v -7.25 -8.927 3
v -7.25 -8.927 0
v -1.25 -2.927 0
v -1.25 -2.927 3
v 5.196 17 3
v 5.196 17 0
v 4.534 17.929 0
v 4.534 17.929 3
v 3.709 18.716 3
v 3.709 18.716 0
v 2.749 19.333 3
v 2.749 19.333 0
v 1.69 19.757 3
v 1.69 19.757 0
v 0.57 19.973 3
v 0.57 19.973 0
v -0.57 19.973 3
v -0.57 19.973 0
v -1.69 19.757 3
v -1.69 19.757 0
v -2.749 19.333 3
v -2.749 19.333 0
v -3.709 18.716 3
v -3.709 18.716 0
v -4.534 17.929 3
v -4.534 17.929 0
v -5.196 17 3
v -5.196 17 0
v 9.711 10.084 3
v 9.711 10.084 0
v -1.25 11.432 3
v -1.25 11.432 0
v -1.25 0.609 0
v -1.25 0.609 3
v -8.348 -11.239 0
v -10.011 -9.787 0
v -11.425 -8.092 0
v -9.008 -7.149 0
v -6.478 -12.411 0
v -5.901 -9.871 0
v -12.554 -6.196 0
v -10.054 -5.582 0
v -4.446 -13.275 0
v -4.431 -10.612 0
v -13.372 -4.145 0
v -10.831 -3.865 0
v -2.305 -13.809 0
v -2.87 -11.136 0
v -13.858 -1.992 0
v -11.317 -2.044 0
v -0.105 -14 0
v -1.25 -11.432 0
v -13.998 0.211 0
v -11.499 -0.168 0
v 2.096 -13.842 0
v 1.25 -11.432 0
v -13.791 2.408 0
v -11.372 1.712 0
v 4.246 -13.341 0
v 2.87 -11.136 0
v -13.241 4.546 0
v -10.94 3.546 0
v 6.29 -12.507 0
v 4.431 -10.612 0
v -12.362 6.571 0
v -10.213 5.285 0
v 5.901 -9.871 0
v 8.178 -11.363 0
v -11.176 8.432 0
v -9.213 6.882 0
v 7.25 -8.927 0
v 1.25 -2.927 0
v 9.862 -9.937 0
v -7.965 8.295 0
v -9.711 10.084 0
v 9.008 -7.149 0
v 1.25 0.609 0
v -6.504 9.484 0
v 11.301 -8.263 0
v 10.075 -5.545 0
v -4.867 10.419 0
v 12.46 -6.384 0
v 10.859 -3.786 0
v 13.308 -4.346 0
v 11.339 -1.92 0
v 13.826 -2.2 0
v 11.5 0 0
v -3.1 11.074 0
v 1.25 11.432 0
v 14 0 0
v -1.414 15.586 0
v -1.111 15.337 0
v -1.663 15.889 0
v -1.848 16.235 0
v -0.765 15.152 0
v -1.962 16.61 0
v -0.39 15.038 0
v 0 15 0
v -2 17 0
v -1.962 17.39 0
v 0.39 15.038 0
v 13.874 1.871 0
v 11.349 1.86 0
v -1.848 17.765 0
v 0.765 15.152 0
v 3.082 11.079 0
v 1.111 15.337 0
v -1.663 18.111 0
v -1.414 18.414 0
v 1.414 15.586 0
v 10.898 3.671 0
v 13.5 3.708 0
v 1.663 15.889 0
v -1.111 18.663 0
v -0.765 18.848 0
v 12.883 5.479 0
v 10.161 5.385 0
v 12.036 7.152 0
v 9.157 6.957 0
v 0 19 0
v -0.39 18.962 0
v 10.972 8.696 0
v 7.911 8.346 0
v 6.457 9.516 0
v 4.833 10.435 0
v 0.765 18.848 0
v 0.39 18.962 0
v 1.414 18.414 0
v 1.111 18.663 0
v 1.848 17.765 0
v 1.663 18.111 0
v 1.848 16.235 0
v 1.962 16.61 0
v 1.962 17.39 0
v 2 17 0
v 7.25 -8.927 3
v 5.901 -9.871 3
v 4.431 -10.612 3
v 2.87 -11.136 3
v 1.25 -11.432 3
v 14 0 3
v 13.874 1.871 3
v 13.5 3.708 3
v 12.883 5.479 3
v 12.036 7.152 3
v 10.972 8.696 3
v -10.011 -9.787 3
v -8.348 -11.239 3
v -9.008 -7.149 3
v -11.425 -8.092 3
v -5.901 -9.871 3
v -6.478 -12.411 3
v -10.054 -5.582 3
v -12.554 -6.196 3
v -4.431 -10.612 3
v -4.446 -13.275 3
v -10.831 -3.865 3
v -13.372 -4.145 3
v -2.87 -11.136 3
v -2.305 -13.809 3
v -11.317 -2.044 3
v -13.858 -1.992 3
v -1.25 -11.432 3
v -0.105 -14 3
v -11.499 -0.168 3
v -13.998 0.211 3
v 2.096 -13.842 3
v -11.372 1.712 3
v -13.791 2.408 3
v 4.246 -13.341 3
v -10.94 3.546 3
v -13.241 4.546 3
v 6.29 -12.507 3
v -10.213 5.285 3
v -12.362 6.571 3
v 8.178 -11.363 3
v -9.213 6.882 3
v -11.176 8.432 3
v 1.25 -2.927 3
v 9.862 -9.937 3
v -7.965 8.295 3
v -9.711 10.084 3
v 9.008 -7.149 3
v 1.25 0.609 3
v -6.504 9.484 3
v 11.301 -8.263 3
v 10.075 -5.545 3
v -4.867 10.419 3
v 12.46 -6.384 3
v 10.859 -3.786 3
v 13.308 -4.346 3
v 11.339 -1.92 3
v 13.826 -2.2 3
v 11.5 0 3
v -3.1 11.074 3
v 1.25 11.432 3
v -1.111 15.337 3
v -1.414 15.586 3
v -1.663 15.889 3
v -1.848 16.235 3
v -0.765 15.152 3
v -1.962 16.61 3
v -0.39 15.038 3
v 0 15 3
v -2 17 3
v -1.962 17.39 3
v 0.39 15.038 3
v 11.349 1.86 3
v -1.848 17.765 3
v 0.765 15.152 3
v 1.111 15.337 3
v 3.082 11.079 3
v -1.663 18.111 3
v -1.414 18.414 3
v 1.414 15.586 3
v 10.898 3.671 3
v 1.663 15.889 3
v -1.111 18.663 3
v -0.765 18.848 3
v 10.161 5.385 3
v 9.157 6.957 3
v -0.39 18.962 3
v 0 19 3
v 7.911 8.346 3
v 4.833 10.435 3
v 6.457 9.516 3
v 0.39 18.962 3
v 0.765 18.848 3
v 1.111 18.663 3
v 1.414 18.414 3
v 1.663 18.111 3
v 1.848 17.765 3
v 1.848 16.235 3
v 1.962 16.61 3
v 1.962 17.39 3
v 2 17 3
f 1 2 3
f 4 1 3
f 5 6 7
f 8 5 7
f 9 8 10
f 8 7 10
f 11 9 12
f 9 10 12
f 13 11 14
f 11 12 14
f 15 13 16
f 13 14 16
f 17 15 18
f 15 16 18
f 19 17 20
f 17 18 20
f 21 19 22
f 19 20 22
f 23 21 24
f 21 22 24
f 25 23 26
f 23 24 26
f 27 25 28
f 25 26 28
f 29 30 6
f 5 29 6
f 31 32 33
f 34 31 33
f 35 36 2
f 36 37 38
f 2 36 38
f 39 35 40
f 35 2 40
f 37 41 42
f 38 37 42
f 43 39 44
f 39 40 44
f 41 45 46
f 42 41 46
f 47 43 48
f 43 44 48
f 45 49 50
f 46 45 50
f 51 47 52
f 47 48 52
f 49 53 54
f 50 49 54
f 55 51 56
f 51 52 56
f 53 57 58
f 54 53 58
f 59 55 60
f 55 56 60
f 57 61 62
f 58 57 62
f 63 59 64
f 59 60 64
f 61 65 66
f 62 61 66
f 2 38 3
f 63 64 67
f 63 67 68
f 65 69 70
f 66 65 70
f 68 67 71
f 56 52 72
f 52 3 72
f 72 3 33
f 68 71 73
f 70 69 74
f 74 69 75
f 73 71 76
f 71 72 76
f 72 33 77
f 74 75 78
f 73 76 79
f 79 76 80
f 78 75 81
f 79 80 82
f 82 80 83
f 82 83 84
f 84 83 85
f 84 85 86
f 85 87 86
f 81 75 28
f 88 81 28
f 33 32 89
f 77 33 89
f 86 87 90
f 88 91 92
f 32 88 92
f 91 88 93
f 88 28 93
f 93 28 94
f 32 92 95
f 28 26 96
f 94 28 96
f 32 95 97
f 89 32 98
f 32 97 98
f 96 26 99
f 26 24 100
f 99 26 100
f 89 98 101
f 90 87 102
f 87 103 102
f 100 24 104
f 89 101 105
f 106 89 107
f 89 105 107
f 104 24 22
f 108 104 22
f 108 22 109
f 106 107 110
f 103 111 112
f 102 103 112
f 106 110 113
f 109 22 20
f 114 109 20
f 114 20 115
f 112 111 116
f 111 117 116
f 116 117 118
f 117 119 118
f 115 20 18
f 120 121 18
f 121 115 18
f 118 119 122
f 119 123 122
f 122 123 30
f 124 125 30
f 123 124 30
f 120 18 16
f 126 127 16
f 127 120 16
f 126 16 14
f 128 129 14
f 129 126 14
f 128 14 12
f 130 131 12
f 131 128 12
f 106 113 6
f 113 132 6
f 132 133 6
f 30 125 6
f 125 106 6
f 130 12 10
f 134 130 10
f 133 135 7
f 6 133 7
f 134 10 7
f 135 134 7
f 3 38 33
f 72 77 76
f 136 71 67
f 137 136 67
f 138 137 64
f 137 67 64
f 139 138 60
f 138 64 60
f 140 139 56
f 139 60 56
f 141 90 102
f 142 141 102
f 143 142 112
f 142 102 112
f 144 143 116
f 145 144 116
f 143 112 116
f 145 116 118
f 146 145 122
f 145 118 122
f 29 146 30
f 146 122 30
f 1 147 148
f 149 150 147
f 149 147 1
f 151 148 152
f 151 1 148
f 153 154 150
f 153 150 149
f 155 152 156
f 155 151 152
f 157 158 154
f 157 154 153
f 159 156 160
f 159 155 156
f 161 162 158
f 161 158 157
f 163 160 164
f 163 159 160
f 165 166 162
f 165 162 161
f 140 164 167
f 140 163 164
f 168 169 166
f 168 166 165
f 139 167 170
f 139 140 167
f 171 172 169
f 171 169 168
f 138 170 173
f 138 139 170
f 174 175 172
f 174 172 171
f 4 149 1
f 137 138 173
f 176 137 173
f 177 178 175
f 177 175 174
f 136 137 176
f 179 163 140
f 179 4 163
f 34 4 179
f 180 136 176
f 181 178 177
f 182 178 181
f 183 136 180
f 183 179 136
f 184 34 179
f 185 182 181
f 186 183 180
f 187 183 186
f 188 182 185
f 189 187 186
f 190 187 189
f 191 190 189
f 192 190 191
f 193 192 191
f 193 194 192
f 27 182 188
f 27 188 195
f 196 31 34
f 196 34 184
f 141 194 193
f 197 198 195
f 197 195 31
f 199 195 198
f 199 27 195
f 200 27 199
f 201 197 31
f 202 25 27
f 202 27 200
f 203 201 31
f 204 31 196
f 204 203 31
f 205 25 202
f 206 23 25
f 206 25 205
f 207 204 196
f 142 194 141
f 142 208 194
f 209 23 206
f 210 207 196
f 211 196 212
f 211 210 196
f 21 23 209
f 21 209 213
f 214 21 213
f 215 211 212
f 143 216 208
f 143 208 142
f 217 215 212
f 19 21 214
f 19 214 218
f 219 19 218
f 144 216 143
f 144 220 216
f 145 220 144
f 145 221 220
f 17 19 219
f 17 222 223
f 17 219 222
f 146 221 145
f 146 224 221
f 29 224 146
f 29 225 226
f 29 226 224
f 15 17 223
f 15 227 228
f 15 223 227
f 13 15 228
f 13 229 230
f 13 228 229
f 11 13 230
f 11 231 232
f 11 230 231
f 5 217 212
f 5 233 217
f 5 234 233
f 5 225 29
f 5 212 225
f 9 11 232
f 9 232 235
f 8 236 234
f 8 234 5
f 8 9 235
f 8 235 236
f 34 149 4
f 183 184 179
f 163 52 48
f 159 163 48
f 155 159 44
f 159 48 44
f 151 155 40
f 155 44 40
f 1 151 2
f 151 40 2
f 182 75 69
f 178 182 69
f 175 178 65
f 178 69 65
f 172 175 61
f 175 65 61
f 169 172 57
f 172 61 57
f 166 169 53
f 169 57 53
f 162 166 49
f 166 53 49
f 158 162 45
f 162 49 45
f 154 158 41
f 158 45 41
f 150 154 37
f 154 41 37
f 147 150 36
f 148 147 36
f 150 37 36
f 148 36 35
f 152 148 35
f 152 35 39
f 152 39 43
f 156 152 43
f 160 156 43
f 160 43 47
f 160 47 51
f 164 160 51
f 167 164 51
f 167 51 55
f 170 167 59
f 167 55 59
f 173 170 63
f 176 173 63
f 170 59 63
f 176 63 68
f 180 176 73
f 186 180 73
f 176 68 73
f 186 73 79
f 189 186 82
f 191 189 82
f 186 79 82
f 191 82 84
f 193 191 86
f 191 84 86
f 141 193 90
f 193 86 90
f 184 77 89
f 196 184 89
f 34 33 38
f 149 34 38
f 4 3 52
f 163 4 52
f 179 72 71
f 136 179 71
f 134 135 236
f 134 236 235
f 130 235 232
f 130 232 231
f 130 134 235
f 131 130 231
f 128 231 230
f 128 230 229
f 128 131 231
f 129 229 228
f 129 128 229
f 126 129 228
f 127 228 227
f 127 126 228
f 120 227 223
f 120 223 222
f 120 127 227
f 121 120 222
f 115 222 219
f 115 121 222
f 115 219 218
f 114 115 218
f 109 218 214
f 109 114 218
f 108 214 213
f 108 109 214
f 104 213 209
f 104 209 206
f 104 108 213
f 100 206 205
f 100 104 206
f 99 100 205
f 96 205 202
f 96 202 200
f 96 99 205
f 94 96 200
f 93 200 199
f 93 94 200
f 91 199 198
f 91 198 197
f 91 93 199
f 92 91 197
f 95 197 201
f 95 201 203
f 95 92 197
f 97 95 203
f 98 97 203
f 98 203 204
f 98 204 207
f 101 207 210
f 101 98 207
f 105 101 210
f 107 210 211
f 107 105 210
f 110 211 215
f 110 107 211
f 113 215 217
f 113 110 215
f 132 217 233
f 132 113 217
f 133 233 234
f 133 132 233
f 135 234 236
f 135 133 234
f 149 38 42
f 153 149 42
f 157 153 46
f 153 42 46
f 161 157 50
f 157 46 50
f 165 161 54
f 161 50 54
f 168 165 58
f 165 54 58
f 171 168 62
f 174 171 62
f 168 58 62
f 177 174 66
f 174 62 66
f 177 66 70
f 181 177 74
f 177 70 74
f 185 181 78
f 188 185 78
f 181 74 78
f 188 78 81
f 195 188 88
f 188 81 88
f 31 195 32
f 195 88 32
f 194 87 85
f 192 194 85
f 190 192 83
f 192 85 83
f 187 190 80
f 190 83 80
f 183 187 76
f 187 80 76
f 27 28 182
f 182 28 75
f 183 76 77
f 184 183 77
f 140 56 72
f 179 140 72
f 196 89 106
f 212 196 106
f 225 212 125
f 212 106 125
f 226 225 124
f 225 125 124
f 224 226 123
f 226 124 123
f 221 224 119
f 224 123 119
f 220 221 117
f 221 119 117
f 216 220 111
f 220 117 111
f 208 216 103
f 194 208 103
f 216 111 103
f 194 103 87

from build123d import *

# Parameters (mm, degrees)
F1_R     = 2
F2_DEPTH = 3


with BuildPart() as f2:
    # F1 (on Top) → F2 (new body)
    with BuildSketch(Plane.XY):
        with BuildLine():
            ThreePointArc((-9.7114153746, 10.0840672063), (-5.4790594428, -12.8833189676), (14, 0))
            ThreePointArc((14, 0), (12.8833189676, 5.4790594428), (9.7114153746, 10.0840672063))
            ThreePointArc((9.7114153746, 10.0840672063), (7.8963049332, 11.5606387541), (5.8606261419, 12.7142857143))
            ThreePointArc((5.8606261419, 12.7142857143), (0, 14), (-5.8606261419, 12.7142857143))
            ThreePointArc((-5.8606261419, 12.7142857143), (-7.8963049332, 11.5606387541), (-9.7114153746, 10.0840672063))
        make_face()
        with BuildLine():
            ThreePointArc((1.25, 11.4318633652), (8.5622718948, 7.6770762664), (11.5, 0))
            ThreePointArc((11.5, 0), (10.8590955773, -3.7855043577), (9.0078185666, -7.1490701963))
            ThreePointArc((9.0078185666, -7.1490701963), (8.1773610714, -8.0858373659), (7.25, -8.9267855357))
            ThreePointArc((7.25, -8.9267855357), (4.4307283524, -10.6121932826), (1.25, -11.4318633652))
            ThreePointArc((1.25, -11.4318633652), (0, -11.5), (-1.25, -11.4318633652))
            ThreePointArc((-1.25, -11.4318633652), (-4.4307283524, -10.6121932826), (-7.25, -8.9267855357))
            ThreePointArc((-7.25, -8.9267855357), (-8.1773610714, -8.0858373659), (-9.0078185666, -7.1490701963))
            ThreePointArc((-9.0078185666, -7.1490701963), (-10.6121856109, 4.4307467271), (-1.25, 11.4318633652))
            ThreePointArc((-1.25, 11.4318633652), (0, 11.5), (1.25, 11.4318633652))
        make_face(mode=Mode.SUBTRACT)
        with BuildLine():
            ThreePointArc((5.8606261419, 12.7142857143), (7.8963049332, 11.5606387541), (9.7114153746, 10.0840672063))
            Line((9.7114153746, 10.0840672063), (5.1961524227, 17))
            ThreePointArc((5.1961524227, 17), (5.9291588604, 14.9192797226), (5.8606261419, 12.7142857143))
        make_face()
        with BuildLine():
            Line((-5.1961524227, 17), (-9.7114153746, 10.0840672063))
            ThreePointArc((-9.7114153746, 10.0840672063), (-7.8963049332, 11.5606387541), (-5.8606261419, 12.7142857143))
            ThreePointArc((-5.8606261419, 12.7142857143), (-5.9291588604, 14.9192797226), (-5.1961524227, 17))
        make_face()
        with BuildLine():
            ThreePointArc((-5.8606261419, 12.7142857143), (0, 14), (5.8606261419, 12.7142857143))
            ThreePointArc((5.8606261419, 12.7142857143), (5.9291588604, 14.9192797226), (5.1961524227, 17))
            ThreePointArc((5.1961524227, 17), (0, 20), (-5.1961524227, 17))
            ThreePointArc((-5.1961524227, 17), (-5.9291588604, 14.9192797226), (-5.8606261419, 12.7142857143))
        make_face()
        with Locations((0, 17)):
            Circle(F1_R, mode=Mode.SUBTRACT)
        with BuildLine():
            Line((1.25, 0.6087483703), (1.25, 11.4318633652))
            ThreePointArc((1.25, 11.4318633652), (0, 11.5), (-1.25, 11.4318633652))
            Line((-1.25, 11.4318633652), (-1.25, 0.6087483703))
            Line((-1.25, 0.6087483703), (-9.0078185666, -7.1490701963))
            ThreePointArc((-9.0078185666, -7.1490701963), (-8.1773610714, -8.0858373659), (-7.25, -8.9267855357))
            Line((-7.25, -8.9267855357), (-1.25, -2.9267855357))
            Line((-1.25, -2.9267855357), (-1.25, -11.4318633652))
            ThreePointArc((-1.25, -11.4318633652), (0, -11.5), (1.25, -11.4318633652))
            Line((1.25, -11.4318633652), (1.25, -2.9267855357))
            Line((1.25, -2.9267855357), (7.25, -8.9267855357))
            ThreePointArc((7.25, -8.9267855357), (8.1773610714, -8.0858373659), (9.0078185666, -7.1490701963))
            Line((9.0078185666, -7.1490701963), (1.25, 0.6087483703))
        make_face()
    extrude(amount=F2_DEPTH)


solid = f2.part
